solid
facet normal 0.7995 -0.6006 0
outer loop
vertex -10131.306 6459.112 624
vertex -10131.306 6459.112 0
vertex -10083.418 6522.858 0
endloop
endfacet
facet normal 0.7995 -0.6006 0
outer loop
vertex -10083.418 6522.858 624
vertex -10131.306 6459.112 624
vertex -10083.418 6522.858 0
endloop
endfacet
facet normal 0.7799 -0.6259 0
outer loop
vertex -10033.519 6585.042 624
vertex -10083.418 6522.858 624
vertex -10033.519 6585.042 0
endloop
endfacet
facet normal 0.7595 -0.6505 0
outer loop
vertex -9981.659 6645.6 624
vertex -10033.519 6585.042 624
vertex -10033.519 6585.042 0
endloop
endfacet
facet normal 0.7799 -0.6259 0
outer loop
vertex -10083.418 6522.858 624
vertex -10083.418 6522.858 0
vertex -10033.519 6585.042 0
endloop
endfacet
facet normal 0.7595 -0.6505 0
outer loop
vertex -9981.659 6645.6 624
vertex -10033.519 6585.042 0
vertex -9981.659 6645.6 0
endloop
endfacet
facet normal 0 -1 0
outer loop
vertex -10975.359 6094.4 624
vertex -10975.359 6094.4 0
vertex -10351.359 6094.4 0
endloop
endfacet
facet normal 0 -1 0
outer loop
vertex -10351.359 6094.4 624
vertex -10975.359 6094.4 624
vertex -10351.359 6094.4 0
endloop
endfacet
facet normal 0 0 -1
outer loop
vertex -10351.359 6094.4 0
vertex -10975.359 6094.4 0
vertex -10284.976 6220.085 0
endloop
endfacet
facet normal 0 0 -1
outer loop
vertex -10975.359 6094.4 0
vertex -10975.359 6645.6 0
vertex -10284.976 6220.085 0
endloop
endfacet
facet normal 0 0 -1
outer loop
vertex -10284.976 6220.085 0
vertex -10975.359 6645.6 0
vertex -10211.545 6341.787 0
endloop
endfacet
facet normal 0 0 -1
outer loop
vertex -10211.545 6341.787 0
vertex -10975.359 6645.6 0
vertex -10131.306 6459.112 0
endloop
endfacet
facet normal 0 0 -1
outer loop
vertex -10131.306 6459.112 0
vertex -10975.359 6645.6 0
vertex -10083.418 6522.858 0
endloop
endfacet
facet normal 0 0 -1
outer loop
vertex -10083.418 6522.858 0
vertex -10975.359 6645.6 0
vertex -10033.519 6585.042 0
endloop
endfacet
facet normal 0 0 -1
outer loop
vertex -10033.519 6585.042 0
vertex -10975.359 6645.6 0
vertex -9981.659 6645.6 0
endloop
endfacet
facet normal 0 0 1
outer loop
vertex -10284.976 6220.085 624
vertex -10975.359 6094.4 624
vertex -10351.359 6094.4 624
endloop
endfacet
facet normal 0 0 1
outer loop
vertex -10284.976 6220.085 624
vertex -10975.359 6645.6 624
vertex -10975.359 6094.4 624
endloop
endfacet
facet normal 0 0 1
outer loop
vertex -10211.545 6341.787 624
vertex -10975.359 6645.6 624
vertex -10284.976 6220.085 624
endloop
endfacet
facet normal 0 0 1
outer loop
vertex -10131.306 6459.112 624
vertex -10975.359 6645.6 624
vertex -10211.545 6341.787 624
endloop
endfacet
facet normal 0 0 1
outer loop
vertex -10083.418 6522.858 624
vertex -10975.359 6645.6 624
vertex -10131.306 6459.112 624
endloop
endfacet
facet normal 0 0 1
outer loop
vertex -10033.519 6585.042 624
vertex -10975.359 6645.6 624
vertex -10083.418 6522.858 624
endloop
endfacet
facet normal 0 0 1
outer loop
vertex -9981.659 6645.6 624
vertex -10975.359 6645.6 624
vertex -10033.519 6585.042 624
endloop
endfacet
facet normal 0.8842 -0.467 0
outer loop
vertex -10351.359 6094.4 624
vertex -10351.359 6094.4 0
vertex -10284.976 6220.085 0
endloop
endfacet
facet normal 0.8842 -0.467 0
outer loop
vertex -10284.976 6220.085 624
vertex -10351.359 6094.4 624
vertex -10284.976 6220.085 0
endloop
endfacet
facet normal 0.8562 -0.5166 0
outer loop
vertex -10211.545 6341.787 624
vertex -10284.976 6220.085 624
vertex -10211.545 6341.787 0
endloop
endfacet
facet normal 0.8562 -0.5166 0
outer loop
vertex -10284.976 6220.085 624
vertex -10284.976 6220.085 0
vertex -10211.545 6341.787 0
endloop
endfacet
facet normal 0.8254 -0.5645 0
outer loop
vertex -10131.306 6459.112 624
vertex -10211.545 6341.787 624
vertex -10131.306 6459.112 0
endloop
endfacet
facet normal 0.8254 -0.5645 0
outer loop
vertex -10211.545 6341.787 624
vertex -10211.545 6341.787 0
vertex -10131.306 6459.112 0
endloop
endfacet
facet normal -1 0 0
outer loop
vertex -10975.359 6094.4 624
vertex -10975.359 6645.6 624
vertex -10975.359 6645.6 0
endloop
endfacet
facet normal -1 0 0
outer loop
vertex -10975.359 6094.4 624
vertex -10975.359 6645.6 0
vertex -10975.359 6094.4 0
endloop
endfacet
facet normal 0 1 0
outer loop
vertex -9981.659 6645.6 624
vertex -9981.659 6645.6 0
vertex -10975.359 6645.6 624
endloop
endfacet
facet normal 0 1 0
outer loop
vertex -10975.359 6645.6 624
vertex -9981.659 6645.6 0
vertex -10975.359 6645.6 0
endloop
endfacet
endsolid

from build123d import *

# Parameters (mm, degrees)
EXTRUDE_1_DEPTH = 480
SCALE_1_SCALE   = 1.3


with BuildPart() as part:
    # 草图1 → 凸台-拉伸1 (new body)
    with BuildSketch(Plane.XY):
        with BuildLine():
            Line((-8442.584105349, 4688), (-7962.584105349, 4688))
            ThreePointArc((-7962.584105349, 4688), (-7883.943917736, 4831.891322342), (-7793.3126292, 4968.547684402))
            ThreePointArc((-7793.3126292, 4968.547684402), (-7737.474510483, 5041.653065761), (-7678.198873592, 5112))
            Line((-7678.198873592, 5112), (-8158.198873592, 5112))
            Line((-8158.198873592, 5112), (-8442.584105349, 5112))
            Line((-8442.584105349, 5112), (-8442.584105349, 4688))
        make_face()
    extrude(amount=EXTRUDE_1_DEPTH)


with BuildPart() as part_1:
    # 缩放比例1: scaled about (0, 0, 0)
    add(part.part.scale(SCALE_1_SCALE))


solid = part_1.part
